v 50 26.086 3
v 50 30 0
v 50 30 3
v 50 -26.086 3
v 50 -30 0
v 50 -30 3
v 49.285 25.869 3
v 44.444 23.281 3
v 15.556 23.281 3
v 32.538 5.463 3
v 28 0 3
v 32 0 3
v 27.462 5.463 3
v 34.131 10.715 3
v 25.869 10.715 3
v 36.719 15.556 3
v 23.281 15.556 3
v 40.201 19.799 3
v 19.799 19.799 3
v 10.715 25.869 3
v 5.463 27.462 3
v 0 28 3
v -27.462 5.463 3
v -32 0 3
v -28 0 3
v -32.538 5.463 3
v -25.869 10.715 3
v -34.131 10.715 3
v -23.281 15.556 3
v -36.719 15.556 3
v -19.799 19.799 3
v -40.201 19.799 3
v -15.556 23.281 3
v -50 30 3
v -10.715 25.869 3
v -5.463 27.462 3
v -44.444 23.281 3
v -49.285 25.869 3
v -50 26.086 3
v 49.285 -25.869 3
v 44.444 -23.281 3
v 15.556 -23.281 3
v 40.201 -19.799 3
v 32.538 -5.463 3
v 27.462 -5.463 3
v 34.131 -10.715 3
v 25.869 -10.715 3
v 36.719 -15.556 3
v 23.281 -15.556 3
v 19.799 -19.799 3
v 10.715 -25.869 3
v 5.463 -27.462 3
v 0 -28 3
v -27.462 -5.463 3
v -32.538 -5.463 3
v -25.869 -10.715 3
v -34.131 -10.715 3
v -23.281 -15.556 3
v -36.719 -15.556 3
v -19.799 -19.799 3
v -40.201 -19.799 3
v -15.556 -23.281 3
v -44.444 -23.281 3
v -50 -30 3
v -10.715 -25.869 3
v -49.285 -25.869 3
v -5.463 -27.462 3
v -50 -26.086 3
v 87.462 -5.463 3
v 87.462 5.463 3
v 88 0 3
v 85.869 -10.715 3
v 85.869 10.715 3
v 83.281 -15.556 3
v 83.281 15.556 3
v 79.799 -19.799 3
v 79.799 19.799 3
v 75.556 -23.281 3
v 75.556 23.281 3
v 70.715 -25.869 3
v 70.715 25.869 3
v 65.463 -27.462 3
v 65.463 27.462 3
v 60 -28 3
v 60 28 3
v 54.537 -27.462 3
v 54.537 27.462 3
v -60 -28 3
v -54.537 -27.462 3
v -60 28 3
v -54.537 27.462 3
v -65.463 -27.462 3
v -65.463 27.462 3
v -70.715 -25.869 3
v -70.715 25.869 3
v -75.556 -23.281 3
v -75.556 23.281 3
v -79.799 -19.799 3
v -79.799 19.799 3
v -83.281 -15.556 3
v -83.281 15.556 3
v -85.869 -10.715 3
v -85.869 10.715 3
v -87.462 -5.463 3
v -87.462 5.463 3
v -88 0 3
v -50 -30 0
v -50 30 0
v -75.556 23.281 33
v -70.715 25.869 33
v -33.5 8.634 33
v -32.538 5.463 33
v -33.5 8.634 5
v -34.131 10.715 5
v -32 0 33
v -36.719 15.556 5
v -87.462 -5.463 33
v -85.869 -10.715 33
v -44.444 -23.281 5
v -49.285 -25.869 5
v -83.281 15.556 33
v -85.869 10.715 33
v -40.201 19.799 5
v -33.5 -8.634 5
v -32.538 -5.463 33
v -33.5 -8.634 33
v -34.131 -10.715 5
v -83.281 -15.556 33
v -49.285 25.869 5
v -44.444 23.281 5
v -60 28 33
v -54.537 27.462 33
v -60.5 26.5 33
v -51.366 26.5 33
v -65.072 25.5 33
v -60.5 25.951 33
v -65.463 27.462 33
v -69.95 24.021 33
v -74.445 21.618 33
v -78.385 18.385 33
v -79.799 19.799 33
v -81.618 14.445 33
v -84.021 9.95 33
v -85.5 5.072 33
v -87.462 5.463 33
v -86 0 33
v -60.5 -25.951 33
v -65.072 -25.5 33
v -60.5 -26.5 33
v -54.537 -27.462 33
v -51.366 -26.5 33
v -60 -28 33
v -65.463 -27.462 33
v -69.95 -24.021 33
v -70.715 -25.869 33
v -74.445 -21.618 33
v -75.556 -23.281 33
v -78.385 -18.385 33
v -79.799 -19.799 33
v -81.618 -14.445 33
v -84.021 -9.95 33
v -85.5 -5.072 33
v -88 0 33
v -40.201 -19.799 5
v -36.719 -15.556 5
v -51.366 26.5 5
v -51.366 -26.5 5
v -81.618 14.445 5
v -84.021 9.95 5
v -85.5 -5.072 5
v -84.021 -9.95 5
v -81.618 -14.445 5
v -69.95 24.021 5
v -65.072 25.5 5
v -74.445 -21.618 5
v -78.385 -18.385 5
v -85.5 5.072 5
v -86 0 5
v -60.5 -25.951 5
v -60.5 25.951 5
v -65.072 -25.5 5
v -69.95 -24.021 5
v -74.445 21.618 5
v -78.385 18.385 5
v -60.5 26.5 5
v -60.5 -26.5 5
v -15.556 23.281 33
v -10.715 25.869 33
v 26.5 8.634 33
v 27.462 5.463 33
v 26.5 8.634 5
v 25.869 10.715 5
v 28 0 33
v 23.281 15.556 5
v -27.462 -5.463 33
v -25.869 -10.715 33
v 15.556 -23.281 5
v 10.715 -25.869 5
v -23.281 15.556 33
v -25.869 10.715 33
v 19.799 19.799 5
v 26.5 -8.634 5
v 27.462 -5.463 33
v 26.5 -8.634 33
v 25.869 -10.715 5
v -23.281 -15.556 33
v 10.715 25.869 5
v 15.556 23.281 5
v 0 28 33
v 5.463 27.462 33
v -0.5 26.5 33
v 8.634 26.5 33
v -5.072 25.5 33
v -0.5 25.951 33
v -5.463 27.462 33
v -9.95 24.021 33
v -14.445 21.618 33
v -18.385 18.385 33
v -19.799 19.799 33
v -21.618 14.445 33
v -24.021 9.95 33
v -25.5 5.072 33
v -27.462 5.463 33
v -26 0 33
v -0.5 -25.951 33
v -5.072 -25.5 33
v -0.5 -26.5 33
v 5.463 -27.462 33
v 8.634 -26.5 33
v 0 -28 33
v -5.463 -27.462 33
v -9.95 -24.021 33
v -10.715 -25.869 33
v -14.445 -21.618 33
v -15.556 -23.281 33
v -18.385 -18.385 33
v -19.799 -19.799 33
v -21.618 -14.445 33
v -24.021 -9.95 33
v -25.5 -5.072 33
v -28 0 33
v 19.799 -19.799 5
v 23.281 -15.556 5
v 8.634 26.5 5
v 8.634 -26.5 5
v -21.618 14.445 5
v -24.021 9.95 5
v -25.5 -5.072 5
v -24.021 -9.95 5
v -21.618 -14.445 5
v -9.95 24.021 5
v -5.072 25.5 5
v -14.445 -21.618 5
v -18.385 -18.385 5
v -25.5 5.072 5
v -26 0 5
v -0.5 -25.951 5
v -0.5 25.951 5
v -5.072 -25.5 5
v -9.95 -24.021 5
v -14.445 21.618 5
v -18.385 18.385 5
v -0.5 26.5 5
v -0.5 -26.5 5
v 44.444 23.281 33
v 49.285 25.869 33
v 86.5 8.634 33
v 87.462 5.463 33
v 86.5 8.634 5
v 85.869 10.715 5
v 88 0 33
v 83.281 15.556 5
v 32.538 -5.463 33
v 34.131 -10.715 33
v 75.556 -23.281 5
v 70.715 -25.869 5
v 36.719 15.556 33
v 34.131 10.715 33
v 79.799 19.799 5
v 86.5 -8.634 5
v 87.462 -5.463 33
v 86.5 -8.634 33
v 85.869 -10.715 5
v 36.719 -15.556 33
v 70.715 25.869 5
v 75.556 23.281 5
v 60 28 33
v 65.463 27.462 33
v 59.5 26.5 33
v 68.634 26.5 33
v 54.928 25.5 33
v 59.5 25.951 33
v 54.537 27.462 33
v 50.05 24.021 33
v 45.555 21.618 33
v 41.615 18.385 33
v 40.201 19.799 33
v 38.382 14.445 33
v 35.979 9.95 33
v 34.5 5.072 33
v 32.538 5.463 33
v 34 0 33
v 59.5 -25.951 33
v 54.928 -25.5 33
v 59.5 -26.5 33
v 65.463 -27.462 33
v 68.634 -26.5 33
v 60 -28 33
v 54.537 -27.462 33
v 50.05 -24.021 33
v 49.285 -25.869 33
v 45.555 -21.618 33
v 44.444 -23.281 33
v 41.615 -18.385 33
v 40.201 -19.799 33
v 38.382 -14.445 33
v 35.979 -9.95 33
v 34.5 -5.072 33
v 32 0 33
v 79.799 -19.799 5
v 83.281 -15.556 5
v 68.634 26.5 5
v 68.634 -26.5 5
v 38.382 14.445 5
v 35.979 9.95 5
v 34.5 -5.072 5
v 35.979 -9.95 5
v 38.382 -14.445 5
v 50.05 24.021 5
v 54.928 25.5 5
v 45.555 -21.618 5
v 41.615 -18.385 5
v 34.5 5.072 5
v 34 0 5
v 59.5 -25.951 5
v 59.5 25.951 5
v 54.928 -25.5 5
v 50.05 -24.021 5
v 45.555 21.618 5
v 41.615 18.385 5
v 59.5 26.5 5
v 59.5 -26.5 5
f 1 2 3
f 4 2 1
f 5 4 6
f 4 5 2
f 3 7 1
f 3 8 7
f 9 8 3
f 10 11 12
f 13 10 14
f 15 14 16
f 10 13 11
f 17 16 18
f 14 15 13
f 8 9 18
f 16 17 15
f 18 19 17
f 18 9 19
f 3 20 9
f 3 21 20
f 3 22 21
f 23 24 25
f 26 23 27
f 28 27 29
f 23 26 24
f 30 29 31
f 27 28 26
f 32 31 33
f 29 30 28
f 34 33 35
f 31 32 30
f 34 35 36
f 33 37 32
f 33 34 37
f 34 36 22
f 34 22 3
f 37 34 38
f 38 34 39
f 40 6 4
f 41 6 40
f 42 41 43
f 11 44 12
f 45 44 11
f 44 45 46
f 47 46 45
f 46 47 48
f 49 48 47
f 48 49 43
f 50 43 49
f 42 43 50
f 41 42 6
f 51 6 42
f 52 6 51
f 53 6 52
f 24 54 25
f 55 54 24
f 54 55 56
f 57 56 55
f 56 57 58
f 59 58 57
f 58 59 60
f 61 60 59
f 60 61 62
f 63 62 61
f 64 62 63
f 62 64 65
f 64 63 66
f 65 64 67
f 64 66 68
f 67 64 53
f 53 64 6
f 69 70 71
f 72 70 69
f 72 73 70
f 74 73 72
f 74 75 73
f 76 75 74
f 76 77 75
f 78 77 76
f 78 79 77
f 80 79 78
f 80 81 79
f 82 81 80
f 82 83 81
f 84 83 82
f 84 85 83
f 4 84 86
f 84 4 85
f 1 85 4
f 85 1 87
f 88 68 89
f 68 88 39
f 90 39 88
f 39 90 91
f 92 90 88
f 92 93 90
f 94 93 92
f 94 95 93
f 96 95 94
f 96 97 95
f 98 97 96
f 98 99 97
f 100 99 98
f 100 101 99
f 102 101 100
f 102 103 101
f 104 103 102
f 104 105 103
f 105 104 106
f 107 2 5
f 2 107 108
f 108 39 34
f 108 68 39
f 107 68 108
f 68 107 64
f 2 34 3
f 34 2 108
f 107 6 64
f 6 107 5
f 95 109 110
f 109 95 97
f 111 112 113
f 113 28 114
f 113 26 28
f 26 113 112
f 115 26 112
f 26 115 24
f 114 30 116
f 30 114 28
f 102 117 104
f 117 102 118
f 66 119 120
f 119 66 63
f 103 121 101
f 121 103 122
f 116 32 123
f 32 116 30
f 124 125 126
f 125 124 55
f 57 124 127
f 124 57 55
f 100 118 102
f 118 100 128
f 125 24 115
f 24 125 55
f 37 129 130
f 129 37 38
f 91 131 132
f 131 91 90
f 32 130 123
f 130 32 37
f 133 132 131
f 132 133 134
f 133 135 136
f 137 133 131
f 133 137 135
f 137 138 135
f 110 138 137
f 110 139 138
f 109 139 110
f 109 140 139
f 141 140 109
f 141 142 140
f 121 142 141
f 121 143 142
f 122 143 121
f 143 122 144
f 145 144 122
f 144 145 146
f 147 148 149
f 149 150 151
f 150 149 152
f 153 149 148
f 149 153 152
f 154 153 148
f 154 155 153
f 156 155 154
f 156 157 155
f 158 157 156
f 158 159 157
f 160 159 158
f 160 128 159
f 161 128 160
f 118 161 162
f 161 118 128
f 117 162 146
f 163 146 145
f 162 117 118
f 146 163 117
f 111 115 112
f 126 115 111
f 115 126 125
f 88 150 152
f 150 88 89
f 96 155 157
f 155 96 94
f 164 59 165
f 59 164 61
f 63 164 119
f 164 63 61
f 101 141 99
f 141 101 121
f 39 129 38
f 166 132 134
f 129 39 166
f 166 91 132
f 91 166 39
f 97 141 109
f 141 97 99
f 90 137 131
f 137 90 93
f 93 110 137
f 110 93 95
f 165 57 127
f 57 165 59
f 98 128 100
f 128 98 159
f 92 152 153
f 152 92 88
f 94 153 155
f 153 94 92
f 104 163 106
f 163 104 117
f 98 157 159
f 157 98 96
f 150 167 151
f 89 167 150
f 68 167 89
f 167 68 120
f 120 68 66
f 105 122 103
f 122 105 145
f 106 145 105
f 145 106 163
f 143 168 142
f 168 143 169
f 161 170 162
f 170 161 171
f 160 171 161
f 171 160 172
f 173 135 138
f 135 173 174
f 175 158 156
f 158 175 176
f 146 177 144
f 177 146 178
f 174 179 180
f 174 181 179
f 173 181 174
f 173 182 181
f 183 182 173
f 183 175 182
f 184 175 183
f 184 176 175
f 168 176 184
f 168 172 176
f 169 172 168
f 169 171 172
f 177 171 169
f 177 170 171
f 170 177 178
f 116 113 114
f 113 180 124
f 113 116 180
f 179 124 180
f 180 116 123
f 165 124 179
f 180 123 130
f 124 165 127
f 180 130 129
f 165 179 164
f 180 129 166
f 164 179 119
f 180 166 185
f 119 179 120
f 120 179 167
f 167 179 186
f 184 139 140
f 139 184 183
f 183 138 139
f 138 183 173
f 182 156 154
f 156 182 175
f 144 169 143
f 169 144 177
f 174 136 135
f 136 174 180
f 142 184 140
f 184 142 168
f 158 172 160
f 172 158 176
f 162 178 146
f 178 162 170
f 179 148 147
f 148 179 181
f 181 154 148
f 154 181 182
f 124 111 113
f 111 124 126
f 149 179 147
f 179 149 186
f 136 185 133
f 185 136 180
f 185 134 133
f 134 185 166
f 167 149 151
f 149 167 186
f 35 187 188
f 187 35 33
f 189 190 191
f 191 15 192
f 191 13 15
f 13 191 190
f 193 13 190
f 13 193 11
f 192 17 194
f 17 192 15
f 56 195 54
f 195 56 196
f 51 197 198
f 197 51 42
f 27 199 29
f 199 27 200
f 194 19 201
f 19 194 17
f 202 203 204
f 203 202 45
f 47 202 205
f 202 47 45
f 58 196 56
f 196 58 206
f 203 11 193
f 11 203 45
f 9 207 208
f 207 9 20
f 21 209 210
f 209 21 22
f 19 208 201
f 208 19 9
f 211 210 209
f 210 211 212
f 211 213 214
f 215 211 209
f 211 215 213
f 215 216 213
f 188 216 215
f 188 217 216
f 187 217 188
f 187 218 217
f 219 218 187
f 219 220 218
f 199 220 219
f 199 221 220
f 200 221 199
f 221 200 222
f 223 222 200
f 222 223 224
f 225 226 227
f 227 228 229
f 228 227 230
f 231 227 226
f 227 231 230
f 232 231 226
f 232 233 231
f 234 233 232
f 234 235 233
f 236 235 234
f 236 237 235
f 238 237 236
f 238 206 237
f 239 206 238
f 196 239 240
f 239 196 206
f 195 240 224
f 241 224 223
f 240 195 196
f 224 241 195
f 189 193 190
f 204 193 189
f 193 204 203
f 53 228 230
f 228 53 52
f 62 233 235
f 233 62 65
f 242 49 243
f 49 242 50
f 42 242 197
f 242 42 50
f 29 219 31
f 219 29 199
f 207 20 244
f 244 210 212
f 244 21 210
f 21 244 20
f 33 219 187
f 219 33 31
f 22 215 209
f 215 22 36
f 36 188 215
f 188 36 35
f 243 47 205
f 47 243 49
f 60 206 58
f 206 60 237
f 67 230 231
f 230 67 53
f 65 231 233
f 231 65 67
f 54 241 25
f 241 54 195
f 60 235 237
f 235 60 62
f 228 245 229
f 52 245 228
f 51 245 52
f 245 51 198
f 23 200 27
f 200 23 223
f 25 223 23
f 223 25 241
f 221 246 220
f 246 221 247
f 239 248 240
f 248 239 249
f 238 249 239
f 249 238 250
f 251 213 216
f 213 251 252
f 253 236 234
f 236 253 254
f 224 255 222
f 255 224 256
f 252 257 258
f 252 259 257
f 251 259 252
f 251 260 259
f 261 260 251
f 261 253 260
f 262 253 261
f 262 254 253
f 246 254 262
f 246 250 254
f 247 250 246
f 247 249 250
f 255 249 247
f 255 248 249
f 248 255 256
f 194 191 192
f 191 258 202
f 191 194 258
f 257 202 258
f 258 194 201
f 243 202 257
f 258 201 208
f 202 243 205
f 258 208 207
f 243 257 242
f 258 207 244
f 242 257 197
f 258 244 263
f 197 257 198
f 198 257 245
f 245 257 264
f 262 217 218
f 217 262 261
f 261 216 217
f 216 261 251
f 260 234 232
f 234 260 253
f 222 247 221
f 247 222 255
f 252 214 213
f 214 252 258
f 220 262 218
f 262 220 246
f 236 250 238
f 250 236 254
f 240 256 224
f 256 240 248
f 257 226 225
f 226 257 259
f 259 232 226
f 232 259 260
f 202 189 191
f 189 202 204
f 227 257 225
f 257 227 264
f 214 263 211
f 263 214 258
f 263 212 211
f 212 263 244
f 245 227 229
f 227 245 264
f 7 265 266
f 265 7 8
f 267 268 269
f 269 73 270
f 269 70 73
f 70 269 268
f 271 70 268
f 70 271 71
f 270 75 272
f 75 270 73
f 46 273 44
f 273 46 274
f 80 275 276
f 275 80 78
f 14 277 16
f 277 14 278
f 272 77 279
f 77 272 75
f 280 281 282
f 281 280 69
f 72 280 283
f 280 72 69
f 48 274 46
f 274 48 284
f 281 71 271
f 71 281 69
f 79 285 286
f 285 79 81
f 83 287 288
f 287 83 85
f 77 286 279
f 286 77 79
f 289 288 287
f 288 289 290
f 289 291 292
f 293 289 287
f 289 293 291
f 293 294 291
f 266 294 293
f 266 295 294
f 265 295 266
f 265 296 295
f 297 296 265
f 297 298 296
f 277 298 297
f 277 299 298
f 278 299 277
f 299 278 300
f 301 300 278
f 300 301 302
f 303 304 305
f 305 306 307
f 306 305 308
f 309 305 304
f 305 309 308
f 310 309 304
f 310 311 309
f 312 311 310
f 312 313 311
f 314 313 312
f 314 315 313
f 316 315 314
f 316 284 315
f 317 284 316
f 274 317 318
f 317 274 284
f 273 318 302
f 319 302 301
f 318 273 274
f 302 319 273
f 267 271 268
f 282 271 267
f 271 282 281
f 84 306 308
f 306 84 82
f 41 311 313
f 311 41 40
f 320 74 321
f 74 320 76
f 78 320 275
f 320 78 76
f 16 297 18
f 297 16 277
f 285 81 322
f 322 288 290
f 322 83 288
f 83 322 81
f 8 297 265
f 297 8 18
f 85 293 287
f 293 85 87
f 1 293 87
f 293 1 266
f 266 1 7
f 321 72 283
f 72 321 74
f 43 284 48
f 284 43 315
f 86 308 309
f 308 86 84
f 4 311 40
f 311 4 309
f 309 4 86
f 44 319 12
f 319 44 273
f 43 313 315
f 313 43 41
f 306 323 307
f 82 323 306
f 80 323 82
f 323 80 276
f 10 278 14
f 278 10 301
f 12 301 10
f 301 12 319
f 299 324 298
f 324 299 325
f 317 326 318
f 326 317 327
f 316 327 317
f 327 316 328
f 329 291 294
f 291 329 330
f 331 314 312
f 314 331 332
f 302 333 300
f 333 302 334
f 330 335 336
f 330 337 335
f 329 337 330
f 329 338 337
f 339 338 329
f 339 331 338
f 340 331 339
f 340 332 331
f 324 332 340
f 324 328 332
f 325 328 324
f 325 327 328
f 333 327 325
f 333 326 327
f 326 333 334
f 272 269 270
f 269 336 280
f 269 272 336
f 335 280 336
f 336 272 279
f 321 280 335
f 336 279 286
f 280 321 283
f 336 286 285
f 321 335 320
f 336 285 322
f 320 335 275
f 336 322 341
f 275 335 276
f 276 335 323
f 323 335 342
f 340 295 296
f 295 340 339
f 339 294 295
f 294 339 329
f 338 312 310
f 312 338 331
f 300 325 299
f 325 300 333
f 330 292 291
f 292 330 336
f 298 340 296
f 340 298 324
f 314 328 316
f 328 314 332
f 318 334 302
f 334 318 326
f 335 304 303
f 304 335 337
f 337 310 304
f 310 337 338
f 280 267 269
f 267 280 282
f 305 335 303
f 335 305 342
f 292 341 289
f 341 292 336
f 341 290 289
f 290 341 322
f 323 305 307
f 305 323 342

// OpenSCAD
// file: part_two.scad
// ============================================================
// PART: Part Two
// Description: Holder/mount component for [PROJECT_NAME]
// ============================================================

include <../config.scad>
include <consts.scad>

// ============================================================
// PART MODULE
// ============================================================

// Module: part_two()
// Usage:
//   part_two();
//   part_two(height, wall);
// Description:
//   Creates a holder/mount component with a slot
// Arguments:
//   height = Overall height of the holder. Default: BASE_HEIGHT
//   wall = Wall thickness. Default: WALL_THICKNESS
// Example(3D): Standard holder
//   part_two();
// Example(3D): Taller holder with thicker walls
//   part_two(height=50, wall=3);
module part_two(
    height = BASE_HEIGHT,
    wall = WALL_THICKNESS
) {
    difference() {
        // Main body - cylinder or rounded rectangle
        translate([0, 0, height/2])
            cylinder(
                d = SLOT_WIDTH + wall * 2,
                h = height,
                center = true
            );

        // Slot for widget
        translate([0, 0, wall])
            cylinder(
                d = SLOT_WIDTH,
                h = height,
                center = false
            );

        // Side opening for insertion
        translate([SLOT_WIDTH/4, 0, height/2 + wall])
            cube([
                SLOT_WIDTH/2 + 1,
                SLOT_WIDTH + 1,
                height
            ], center = true);
    }
}

// ============================================================
// RENDER
// ============================================================

// Render this part when file is opened directly
part_two();
// file: part_one.scad
// ============================================================
// PART: Part One
// Description: Base plate for [PROJECT_NAME]
// ============================================================

include <../config.scad>
include <consts.scad>

// ============================================================
// PART MODULE
// ============================================================

// Module: part_one()
// Usage:
//   part_one();
//   part_one(width, depth, thickness);
// Description:
//   Creates the base plate with mounting holes
// Arguments:
//   width = Width of the base plate. Default: BASE_WIDTH
//   depth = Depth of the base plate. Default: BASE_DEPTH
//   thickness = Thickness of the plate. Default: FLOOR_THICKNESS
// Example(3D): Standard base plate
//   part_one();
// Example(3D): Custom sized base plate
//   part_one(width=150, depth=80, thickness=5);
module part_one(
    width = BASE_WIDTH,
    depth = BASE_DEPTH,
    thickness = FLOOR_THICKNESS
) {
    difference() {
        // Main plate body
        translate([0, 0, thickness/2])
            cube([width, depth, thickness], center = true);

        // Mounting holes at corners
        for (x = [-1, 1], y = [-1, 1]) {
            translate([
                x * MOUNTING_HOLE_SPACING/2,
                y * MOUNTING_HOLE_SPACING/2,
                -0.1
            ])
                cylinder(
                    d = MOUNTING_HOLE_DIAMETER,
                    h = thickness + 0.2,
                    $fn = EXPORT_MODE ? 64 : 16
                );
        }
    }
}

// ============================================================
// RENDER
// ============================================================

// Render this part when file is opened directly
part_one();
// file: consts.scad
// ============================================================
// SHARED CONSTANTS
// Description: Constants used by multiple parts in [PROJECT_NAME]
// ============================================================

// ============================================================
// WIDGET DIMENSIONS
// ============================================================
// Example: If your project holds/fits a specific object,
// define its dimensions here

// Widget dimensions (example - replace with your actual object)
WIDGET_DIAMETER = 50;
WIDGET_HEIGHT = 20;

// ============================================================
// CALCULATED DIMENSIONS
// ============================================================
// Dimensions derived from base constants and tolerances

// Slot/holder sizing with clearance
SLOT_WIDTH = WIDGET_DIAMETER + 2;      // 2mm total clearance
SLOT_HEIGHT = WIDGET_HEIGHT + 1;       // 1mm clearance

// Spacing between elements
ELEMENT_SPACING = WIDGET_DIAMETER + 10;  // 10mm gap between widgets

// ============================================================
// EXAMPLE USAGE
// ============================================================
// In your part files:
//   include <consts.scad>
//   cylinder(d = WIDGET_DIAMETER + TOLERANCE, h = WIDGET_HEIGHT);
// file: ../config.scad
// ============================================================
// PROJECT CONFIGURATION
// Description: Global settings for [PROJECT_NAME]
// ============================================================

// ============================================================
// RENDERING SETTINGS
// ============================================================

// Preview quality (lower = faster preview)
PREVIEW_FN = 32;

// Export quality (higher = smoother STL)
EXPORT_FN = 128;

// Current mode (set to true when exporting STL)
// Override from command line: openscad -D 'EXPORT_MODE=true' ...
EXPORT_MODE = false;

// Convenience variable - automatically use correct quality
$fn = EXPORT_MODE ? EXPORT_FN : PREVIEW_FN;

// ============================================================
// PROJECT DIMENSIONS
// ============================================================

// Base dimensions (millimeters)
BASE_WIDTH = 100;
BASE_DEPTH = 60;
BASE_HEIGHT = 30;

// Material settings
WALL_THICKNESS = 2;
FLOOR_THICKNESS = 3;

// Hardware
MOUNTING_HOLE_DIAMETER = 5;
MOUNTING_HOLE_SPACING = 80;

// ============================================================
// TOLERANCES
// ============================================================

// General fit tolerance (for sliding parts)
TOLERANCE = 0.2;

// Tight fit (press-fit, requires force)
TIGHT_FIT = 0.1;

// Loose fit (easy sliding, clearance)
LOOSE_FIT = 0.5;

// 3D printer compensation (add to holes, subtract from pegs)
PRINTER_TOLERANCE = 0.15;

// ============================================================
// FEATURE FLAGS
// ============================================================

// Enable experimental features
ENABLE_ADVANCED_FEATURES = false;

// Include support structures in export
INCLUDE_SUPPORTS = false;

// Show reference geometry in previews
SHOW_REFERENCE = true;

// ============================================================
// RENDERING HELPERS
// ============================================================

// Helper function to determine if we're in preview mode
function is_preview() = !EXPORT_MODE;

// Helper function to determine if we're in export mode
function is_export() = EXPORT_MODE;
// main file
// ============================================================
// ASSEMBLY VIEW
// Description: Combined view of all parts (not for export)
// ============================================================
// This file shows how all parts fit together
// DO NOT export this file directly - export individual parts

include <../config.scad>
include <consts.scad>

use <part_one.scad>
use <part_two.scad>

// ============================================================
// ASSEMBLY
// ============================================================

// Base plate at origin
color("lightblue")
    part_one();

// Holders positioned on base
for (i = [0 : 2]) {
    translate([
        (i - 1) * ELEMENT_SPACING,
        0,
        FLOOR_THICKNESS
    ])
    color("gray")
        part_two();
}

// ============================================================
// REFERENCE GEOMETRY
// ============================================================

// Show widget for reference (semi-transparent)
if (SHOW_REFERENCE) {
    for (i = [0 : 2]) {
        translate([
            (i - 1) * ELEMENT_SPACING,
            0,
            FLOOR_THICKNESS + WALL_THICKNESS + SLOT_HEIGHT/2
        ])
        %color("black", alpha=0.3)
            cylinder(
                d = WIDGET_DIAMETER,
                h = WIDGET_HEIGHT,
                center = true
            );
    }
}
